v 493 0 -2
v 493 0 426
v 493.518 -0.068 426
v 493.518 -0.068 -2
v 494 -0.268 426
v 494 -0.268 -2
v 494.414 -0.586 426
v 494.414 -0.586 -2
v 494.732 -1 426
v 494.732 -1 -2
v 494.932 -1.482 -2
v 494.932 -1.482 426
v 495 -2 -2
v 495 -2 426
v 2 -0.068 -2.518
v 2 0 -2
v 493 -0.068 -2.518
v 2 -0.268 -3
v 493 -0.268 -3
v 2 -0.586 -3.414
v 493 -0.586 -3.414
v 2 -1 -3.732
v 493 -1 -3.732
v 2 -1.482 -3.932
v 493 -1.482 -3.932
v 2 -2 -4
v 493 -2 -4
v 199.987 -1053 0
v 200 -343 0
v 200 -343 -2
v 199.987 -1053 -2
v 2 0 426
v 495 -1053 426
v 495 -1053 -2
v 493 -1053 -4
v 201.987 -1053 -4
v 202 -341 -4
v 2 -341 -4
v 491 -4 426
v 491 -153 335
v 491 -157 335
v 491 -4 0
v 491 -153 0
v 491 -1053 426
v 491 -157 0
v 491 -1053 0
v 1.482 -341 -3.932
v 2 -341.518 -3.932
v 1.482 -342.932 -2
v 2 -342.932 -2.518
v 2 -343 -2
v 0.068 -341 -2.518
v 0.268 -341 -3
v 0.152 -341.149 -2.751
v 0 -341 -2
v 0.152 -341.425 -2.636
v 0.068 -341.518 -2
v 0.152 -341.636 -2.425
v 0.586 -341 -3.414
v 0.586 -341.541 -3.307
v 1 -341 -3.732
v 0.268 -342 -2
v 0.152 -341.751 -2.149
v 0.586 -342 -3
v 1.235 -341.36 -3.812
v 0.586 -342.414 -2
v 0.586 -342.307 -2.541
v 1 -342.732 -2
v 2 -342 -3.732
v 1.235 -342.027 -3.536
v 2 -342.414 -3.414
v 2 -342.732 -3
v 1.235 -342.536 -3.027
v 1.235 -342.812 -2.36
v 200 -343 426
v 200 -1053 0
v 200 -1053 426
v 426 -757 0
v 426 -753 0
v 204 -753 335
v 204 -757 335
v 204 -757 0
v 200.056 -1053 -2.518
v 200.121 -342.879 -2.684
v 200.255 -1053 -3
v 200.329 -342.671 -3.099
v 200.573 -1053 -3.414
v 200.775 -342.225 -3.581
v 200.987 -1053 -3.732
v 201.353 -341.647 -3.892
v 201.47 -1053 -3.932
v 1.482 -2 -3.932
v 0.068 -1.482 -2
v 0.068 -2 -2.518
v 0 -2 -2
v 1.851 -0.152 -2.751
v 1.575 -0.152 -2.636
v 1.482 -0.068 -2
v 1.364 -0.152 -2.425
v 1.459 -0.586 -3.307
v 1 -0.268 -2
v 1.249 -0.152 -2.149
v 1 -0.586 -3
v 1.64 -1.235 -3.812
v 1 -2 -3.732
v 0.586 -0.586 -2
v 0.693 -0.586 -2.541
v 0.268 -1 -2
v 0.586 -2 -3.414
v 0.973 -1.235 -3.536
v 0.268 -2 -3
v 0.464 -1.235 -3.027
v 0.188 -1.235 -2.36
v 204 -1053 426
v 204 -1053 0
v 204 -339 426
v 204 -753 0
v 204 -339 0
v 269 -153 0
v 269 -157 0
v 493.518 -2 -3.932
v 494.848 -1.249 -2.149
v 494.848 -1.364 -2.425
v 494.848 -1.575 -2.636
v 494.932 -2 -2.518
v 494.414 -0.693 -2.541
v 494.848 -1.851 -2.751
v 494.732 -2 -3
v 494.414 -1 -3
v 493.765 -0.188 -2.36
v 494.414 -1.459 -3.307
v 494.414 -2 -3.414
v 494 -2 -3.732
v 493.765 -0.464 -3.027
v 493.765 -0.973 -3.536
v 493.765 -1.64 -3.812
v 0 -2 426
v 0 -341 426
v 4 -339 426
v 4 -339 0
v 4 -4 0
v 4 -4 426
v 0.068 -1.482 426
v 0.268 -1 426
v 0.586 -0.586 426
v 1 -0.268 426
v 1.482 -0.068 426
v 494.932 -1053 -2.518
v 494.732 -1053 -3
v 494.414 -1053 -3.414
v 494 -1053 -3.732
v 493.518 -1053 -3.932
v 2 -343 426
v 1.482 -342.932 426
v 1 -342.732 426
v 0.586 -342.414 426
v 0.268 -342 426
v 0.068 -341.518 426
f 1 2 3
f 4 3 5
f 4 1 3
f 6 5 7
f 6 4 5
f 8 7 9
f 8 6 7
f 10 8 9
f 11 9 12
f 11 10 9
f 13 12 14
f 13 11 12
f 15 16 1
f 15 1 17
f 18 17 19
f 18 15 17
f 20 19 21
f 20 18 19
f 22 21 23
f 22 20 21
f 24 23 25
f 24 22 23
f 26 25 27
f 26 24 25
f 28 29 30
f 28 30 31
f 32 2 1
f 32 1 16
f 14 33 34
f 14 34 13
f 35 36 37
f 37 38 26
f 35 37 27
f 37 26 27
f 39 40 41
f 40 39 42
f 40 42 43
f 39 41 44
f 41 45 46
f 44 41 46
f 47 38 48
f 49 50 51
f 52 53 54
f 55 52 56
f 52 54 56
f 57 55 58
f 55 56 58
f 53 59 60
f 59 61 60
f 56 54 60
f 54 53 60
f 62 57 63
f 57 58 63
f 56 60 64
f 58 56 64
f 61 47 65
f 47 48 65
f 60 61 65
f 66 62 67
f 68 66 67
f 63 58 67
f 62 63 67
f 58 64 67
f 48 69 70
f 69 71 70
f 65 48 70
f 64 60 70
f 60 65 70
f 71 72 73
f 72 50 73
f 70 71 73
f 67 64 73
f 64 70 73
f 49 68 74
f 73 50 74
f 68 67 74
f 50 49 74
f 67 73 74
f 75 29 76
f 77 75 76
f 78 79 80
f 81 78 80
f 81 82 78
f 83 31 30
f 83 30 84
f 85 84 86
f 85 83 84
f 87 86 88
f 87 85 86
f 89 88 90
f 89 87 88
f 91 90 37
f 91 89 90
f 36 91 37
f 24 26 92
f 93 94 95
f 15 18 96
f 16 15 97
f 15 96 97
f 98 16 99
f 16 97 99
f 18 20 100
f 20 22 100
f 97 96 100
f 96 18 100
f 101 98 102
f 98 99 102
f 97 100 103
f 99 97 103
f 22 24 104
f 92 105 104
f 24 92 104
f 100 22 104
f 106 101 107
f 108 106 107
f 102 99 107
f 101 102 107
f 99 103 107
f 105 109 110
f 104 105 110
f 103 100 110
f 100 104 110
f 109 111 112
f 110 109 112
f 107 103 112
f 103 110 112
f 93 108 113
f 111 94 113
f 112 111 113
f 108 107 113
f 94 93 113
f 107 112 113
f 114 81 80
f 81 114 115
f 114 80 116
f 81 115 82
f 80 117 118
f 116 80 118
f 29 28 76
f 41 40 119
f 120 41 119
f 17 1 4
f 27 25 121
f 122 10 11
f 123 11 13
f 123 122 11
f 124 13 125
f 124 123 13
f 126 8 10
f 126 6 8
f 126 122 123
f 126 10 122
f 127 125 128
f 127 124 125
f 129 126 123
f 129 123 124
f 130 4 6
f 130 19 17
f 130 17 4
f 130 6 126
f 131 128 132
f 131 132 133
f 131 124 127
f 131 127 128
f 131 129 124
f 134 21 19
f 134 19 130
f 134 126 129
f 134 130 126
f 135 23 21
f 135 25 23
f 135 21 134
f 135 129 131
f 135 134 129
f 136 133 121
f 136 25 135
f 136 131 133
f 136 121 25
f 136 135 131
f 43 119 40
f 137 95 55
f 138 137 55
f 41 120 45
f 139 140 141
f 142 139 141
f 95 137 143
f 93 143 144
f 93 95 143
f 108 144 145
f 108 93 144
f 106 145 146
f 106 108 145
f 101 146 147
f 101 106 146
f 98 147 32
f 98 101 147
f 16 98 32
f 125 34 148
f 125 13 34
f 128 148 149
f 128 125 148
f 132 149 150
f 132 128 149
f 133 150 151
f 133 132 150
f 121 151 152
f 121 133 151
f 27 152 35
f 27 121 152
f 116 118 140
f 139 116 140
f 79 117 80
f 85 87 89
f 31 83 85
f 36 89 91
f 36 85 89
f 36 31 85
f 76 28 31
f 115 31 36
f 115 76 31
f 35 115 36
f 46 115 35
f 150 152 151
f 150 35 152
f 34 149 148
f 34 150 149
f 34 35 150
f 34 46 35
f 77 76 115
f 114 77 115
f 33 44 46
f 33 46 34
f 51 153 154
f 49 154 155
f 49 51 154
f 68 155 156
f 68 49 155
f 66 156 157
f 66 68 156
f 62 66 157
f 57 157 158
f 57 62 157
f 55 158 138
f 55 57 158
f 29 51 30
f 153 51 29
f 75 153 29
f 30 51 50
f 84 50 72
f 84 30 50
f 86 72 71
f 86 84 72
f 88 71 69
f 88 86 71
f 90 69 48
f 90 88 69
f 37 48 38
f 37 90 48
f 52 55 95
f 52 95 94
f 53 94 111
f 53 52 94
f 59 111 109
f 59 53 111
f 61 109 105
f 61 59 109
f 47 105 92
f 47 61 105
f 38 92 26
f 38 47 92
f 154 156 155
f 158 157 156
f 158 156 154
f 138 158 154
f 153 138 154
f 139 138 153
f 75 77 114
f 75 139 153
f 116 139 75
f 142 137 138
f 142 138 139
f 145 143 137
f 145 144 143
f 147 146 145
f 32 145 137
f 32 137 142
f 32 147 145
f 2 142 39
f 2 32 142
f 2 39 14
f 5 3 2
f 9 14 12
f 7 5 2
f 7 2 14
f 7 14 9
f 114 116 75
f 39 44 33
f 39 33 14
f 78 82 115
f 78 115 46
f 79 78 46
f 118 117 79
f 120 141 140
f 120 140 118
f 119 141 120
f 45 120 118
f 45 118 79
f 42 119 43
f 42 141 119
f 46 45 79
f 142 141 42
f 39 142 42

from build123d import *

# Parameters (mm, degrees)
F1_DEPTH  = 426
F3_DEPTH  = 4
F4_R      = 2
F7_DEPTH  = 4
F8_DEPTH  = 4
F11_DEPTH = 4


# Not quite as in the source:
# - a feature names something its author has since deleted; it is built from what else it names


with BuildPart() as f1:
    # F0 (on Top) → F1 (new body)
    with BuildSketch(Plane.XY):
        Polygon((495, 0), (0, 0), (0, -343), (200, -343), (200, -1053), (204, -1053), (204, -339), (4, -339), (4, -4), (491, -4), (491, -1053), (495, -1053), align=None)
    extrude(amount=F1_DEPTH)

    # F2 (on Top) → F3 (join)
    with BuildSketch(Plane.XY):
        Polygon((0, -343), (200, -343), (199.9874711037, -1053), (495, -1053), (495, 0), (0, 0), align=None)
    extrude(amount=-F3_DEPTH)

    # F4
    f4_edges = [f1.edges().sort_by_distance(p)[0] for p in [
        (100, -343, -4),
        (0, -171.5, -4),
        (247.5, 0, -4),
        (0, -343, 211),
        (0, 0, 211),
        (495, 0, 211),
        (199.993736, -698, -4),
        (495, -526.5, -4),
    ]]
    fillet(f4_edges, radius=F4_R)

    # F6 (on offset) → F7 (join)
    with BuildSketch(Plane.XZ.offset(753)):
        Polygon((426, 0), (204, 335), (204, 0), align=None)
    extrude(amount=F7_DEPTH)

    # F6 (on offset) → F8 (join)
    with BuildSketch(Plane.XZ.offset(753)):
        Polygon((426, 0), (204, 335), (204, 0), align=None)
    extrude(amount=F8_DEPTH)

    # F10 (on offset) → F11 (join)
    with BuildSketch(Plane.XZ.offset(153)):
        Polygon((491, 335), (269, 0), (491, 0), align=None)
    extrude(amount=F11_DEPTH)


solid = f1.part
